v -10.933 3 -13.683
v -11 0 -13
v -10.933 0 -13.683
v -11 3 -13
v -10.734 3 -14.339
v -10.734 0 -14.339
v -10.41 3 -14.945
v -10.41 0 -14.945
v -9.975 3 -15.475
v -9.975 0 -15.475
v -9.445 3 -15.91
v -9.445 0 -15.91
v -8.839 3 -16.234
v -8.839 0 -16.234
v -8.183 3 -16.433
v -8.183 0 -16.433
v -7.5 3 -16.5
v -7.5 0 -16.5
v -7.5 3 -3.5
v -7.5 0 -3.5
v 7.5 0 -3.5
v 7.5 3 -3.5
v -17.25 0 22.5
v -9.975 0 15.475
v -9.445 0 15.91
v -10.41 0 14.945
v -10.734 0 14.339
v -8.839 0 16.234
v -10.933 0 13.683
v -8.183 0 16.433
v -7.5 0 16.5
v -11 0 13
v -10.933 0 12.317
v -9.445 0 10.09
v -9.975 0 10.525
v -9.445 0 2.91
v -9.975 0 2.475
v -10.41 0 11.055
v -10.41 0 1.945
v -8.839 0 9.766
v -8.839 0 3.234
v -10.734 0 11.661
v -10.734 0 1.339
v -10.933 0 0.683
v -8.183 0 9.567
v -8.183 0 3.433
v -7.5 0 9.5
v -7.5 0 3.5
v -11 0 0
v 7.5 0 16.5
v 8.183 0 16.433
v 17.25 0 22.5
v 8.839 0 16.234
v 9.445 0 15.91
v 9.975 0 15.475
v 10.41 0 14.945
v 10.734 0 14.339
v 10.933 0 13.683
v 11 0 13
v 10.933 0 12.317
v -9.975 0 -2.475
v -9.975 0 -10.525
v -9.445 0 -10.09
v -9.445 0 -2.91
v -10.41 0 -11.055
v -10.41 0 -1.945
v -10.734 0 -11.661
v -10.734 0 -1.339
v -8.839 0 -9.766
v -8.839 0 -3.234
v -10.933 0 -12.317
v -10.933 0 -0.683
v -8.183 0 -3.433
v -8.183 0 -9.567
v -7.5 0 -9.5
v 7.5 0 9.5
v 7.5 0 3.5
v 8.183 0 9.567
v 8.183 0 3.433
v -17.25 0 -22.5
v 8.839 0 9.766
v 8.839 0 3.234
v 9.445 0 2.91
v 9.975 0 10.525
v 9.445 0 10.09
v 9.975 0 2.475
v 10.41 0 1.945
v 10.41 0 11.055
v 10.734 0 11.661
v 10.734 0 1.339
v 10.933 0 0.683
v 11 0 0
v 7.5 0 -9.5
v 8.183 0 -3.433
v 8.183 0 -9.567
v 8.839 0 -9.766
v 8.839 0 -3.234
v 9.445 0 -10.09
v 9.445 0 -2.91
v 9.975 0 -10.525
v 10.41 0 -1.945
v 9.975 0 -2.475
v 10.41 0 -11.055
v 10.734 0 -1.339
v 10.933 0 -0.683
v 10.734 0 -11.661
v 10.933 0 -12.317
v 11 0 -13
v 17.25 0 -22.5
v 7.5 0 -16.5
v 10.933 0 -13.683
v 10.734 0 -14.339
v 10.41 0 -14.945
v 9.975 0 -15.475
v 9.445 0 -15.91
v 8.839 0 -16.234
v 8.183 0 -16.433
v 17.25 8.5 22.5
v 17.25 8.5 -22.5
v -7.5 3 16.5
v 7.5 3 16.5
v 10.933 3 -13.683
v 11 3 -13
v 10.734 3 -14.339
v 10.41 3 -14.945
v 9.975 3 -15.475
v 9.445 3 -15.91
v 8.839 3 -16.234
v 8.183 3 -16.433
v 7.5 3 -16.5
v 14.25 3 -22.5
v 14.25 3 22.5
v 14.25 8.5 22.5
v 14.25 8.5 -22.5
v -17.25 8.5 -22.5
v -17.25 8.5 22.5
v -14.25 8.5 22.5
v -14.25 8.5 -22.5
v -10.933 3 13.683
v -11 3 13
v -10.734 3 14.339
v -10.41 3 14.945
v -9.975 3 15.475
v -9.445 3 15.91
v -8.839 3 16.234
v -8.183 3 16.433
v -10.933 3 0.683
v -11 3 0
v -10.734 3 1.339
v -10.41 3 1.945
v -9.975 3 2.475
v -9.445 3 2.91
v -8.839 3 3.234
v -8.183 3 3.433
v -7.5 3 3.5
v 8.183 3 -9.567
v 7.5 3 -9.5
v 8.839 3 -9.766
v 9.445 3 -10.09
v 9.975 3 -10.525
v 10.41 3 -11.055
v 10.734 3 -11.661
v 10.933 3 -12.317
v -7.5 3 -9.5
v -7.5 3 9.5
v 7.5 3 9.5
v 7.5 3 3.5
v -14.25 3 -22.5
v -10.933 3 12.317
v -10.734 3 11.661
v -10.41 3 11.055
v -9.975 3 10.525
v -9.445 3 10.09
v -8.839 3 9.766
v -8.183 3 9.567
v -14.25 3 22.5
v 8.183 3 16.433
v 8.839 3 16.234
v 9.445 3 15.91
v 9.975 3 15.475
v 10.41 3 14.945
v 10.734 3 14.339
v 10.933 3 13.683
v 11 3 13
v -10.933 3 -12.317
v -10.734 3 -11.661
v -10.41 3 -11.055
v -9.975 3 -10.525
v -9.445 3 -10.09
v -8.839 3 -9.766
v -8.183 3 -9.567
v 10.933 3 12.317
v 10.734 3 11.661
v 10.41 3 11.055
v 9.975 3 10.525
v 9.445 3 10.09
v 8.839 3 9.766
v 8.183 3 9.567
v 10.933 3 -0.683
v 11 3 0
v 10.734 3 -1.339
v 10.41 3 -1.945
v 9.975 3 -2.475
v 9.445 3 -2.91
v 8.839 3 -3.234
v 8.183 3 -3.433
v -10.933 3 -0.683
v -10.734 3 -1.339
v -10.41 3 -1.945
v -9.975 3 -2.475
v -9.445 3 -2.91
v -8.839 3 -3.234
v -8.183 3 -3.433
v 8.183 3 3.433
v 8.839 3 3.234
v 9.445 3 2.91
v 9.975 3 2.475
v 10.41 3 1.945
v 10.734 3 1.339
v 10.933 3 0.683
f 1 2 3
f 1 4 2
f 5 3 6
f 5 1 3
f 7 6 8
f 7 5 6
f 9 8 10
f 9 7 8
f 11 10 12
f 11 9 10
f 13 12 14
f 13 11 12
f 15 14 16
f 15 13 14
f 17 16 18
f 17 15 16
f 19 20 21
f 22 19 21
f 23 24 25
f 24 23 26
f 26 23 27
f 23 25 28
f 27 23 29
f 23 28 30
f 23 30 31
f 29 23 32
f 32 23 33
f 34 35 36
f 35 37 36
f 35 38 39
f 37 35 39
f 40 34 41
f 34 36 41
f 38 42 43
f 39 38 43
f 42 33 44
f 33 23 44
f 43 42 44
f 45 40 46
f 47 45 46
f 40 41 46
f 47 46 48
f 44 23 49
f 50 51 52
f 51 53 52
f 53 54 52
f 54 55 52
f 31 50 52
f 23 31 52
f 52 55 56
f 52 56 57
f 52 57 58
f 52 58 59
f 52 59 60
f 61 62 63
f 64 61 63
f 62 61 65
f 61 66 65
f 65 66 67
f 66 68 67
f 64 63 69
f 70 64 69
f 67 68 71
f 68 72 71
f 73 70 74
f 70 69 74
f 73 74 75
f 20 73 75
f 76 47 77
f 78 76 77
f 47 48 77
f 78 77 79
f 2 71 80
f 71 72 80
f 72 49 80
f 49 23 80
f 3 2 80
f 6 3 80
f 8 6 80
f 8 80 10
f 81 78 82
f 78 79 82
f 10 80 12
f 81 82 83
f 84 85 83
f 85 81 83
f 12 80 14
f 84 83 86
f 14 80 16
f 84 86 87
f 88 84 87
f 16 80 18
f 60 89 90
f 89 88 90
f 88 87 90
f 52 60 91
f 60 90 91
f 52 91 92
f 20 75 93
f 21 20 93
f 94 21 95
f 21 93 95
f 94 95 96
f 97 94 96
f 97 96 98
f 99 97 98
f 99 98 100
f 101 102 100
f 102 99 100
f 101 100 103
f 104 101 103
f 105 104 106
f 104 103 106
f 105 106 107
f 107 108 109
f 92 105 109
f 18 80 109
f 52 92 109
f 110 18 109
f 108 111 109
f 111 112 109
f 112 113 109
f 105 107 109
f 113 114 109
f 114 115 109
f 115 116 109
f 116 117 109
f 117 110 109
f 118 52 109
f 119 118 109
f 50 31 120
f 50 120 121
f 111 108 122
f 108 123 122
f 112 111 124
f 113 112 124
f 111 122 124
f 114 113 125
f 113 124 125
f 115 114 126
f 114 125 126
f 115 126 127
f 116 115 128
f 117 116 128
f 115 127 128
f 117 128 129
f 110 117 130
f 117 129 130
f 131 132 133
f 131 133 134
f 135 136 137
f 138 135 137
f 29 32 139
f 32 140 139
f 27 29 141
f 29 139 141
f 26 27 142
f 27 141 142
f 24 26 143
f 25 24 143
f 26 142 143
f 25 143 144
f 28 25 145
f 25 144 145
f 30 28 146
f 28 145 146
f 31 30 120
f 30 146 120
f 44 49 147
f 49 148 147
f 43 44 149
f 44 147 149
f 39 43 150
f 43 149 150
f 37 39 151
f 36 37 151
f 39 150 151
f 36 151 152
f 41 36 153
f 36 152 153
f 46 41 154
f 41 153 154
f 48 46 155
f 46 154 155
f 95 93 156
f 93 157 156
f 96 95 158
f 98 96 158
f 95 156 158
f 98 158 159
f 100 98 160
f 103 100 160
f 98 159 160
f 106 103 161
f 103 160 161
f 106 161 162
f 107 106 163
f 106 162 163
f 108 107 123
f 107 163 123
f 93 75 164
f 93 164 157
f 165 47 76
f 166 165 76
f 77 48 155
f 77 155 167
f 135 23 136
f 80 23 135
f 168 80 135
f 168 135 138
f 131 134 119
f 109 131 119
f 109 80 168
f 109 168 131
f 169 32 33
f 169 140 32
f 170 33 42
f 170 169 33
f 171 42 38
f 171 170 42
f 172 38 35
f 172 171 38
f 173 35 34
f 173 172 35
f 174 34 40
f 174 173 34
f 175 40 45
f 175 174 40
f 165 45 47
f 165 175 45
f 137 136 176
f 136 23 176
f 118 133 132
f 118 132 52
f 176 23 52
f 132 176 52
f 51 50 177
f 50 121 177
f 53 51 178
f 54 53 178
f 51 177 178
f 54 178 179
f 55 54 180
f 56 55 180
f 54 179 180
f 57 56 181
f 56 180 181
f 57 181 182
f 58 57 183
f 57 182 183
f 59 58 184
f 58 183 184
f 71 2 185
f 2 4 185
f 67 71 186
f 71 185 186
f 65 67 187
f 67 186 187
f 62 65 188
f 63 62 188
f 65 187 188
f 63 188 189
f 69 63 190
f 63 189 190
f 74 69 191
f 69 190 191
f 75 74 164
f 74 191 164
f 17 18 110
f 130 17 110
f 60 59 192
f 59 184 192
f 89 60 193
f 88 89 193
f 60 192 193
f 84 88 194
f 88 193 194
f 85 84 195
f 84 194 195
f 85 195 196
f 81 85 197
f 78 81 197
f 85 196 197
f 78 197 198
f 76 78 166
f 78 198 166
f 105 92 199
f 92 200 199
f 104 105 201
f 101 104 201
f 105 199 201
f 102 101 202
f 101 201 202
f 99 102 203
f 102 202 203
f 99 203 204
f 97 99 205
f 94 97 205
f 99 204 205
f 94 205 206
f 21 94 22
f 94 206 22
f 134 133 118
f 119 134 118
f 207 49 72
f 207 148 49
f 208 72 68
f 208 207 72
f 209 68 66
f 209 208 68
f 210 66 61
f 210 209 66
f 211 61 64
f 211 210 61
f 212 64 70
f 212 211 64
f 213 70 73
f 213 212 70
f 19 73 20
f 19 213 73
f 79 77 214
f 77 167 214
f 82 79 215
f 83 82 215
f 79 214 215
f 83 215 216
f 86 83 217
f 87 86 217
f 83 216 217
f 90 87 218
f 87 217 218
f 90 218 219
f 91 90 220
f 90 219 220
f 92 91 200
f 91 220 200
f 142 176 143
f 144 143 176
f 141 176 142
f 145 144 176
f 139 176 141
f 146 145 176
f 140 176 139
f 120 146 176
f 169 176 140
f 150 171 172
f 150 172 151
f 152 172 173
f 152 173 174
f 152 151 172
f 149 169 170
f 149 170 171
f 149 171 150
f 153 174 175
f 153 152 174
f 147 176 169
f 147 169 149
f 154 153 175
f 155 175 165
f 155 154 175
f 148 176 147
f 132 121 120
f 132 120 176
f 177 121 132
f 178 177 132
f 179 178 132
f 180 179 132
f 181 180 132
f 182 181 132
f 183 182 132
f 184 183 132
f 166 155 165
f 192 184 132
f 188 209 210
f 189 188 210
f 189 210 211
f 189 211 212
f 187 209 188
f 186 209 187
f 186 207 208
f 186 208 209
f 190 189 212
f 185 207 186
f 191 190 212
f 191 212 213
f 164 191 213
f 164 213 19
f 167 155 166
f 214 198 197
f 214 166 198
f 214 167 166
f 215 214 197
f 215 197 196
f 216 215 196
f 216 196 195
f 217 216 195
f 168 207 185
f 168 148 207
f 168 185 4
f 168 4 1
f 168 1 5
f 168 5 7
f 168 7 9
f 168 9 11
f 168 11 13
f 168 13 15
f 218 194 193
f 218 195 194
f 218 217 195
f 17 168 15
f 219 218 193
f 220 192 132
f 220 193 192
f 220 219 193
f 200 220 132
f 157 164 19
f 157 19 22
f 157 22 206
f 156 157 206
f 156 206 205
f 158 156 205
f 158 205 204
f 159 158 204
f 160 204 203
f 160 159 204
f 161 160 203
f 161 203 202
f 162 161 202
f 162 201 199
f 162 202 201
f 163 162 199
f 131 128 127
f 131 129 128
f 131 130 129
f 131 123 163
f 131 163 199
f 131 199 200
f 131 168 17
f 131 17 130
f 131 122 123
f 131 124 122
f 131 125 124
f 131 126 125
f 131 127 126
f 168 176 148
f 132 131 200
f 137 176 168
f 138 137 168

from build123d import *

# Parameters (mm, degrees)
SKETCH2_W           = 34.5
SKETCH2_H           = 45
BOSS_EXTRUDE1_DEPTH = 3
SKETCH3_W           = 3
SKETCH3_H           = 45
BOSS_EXTRUDE2_DEPTH = 5.5
SKETCH4_W           = 22
SKETCH4_H           = 7
CUT_EXTRUDE1_DEPTH  = 8
FILLET1_R           = 3.5


with BuildPart() as part:
    # Sketch2 → Boss-Extrude1 (new body)
    with BuildSketch(Plane(origin=(0, 0, 0), x_dir=(1, 0, 0), z_dir=(0, 1, 0))):
        Rectangle(SKETCH2_W, SKETCH2_H)
    extrude(amount=BOSS_EXTRUDE1_DEPTH)

    # Sketch3 → Boss-Extrude2 (add)
    with BuildSketch(Plane(origin=(0, 3, 0), x_dir=(1, 0, 0), z_dir=(0, 1, 0))):
        with Locations((-15.75, 0)):
            Rectangle(SKETCH3_W, SKETCH3_H)
        with Locations((15.75, 0)):
            Rectangle(SKETCH3_W, SKETCH3_H)
    extrude(amount=BOSS_EXTRUDE2_DEPTH)

    # Sketch4 → Cut-Extrude1 (cut)
    with BuildSketch(Plane.XZ):
        with Locations((0, 13)):
            Rectangle(SKETCH4_W, SKETCH4_H)
        Rectangle(SKETCH4_W, SKETCH4_H)
        with Locations((0, -13)):
            Rectangle(SKETCH4_W, SKETCH4_H)
    extrude(amount=-CUT_EXTRUDE1_DEPTH, mode=Mode.SUBTRACT)

    # Fillet1
    fillet1_edges = [part.edges().sort_by_distance(p)[0] for p in [
        (-11, 1.5, -9.5),
        (-11, 1.5, -16.5),
        (11, 1.5, -9.5),
        (11, 1.5, -16.5),
        (11, 1.5, -3.5),
        (-11, 1.5, -3.5),
        (-11, 1.5, 3.5),
        (11, 1.5, 3.5),
        (11, 1.5, 9.5),
        (11, 1.5, 16.5),
        (-11, 1.5, 9.5),
        (-11, 1.5, 16.5),
    ]]
    fillet(fillet1_edges, radius=FILLET1_R - 0.0001)  # a hair under: the kernel refuses the full size


solid = part.part
